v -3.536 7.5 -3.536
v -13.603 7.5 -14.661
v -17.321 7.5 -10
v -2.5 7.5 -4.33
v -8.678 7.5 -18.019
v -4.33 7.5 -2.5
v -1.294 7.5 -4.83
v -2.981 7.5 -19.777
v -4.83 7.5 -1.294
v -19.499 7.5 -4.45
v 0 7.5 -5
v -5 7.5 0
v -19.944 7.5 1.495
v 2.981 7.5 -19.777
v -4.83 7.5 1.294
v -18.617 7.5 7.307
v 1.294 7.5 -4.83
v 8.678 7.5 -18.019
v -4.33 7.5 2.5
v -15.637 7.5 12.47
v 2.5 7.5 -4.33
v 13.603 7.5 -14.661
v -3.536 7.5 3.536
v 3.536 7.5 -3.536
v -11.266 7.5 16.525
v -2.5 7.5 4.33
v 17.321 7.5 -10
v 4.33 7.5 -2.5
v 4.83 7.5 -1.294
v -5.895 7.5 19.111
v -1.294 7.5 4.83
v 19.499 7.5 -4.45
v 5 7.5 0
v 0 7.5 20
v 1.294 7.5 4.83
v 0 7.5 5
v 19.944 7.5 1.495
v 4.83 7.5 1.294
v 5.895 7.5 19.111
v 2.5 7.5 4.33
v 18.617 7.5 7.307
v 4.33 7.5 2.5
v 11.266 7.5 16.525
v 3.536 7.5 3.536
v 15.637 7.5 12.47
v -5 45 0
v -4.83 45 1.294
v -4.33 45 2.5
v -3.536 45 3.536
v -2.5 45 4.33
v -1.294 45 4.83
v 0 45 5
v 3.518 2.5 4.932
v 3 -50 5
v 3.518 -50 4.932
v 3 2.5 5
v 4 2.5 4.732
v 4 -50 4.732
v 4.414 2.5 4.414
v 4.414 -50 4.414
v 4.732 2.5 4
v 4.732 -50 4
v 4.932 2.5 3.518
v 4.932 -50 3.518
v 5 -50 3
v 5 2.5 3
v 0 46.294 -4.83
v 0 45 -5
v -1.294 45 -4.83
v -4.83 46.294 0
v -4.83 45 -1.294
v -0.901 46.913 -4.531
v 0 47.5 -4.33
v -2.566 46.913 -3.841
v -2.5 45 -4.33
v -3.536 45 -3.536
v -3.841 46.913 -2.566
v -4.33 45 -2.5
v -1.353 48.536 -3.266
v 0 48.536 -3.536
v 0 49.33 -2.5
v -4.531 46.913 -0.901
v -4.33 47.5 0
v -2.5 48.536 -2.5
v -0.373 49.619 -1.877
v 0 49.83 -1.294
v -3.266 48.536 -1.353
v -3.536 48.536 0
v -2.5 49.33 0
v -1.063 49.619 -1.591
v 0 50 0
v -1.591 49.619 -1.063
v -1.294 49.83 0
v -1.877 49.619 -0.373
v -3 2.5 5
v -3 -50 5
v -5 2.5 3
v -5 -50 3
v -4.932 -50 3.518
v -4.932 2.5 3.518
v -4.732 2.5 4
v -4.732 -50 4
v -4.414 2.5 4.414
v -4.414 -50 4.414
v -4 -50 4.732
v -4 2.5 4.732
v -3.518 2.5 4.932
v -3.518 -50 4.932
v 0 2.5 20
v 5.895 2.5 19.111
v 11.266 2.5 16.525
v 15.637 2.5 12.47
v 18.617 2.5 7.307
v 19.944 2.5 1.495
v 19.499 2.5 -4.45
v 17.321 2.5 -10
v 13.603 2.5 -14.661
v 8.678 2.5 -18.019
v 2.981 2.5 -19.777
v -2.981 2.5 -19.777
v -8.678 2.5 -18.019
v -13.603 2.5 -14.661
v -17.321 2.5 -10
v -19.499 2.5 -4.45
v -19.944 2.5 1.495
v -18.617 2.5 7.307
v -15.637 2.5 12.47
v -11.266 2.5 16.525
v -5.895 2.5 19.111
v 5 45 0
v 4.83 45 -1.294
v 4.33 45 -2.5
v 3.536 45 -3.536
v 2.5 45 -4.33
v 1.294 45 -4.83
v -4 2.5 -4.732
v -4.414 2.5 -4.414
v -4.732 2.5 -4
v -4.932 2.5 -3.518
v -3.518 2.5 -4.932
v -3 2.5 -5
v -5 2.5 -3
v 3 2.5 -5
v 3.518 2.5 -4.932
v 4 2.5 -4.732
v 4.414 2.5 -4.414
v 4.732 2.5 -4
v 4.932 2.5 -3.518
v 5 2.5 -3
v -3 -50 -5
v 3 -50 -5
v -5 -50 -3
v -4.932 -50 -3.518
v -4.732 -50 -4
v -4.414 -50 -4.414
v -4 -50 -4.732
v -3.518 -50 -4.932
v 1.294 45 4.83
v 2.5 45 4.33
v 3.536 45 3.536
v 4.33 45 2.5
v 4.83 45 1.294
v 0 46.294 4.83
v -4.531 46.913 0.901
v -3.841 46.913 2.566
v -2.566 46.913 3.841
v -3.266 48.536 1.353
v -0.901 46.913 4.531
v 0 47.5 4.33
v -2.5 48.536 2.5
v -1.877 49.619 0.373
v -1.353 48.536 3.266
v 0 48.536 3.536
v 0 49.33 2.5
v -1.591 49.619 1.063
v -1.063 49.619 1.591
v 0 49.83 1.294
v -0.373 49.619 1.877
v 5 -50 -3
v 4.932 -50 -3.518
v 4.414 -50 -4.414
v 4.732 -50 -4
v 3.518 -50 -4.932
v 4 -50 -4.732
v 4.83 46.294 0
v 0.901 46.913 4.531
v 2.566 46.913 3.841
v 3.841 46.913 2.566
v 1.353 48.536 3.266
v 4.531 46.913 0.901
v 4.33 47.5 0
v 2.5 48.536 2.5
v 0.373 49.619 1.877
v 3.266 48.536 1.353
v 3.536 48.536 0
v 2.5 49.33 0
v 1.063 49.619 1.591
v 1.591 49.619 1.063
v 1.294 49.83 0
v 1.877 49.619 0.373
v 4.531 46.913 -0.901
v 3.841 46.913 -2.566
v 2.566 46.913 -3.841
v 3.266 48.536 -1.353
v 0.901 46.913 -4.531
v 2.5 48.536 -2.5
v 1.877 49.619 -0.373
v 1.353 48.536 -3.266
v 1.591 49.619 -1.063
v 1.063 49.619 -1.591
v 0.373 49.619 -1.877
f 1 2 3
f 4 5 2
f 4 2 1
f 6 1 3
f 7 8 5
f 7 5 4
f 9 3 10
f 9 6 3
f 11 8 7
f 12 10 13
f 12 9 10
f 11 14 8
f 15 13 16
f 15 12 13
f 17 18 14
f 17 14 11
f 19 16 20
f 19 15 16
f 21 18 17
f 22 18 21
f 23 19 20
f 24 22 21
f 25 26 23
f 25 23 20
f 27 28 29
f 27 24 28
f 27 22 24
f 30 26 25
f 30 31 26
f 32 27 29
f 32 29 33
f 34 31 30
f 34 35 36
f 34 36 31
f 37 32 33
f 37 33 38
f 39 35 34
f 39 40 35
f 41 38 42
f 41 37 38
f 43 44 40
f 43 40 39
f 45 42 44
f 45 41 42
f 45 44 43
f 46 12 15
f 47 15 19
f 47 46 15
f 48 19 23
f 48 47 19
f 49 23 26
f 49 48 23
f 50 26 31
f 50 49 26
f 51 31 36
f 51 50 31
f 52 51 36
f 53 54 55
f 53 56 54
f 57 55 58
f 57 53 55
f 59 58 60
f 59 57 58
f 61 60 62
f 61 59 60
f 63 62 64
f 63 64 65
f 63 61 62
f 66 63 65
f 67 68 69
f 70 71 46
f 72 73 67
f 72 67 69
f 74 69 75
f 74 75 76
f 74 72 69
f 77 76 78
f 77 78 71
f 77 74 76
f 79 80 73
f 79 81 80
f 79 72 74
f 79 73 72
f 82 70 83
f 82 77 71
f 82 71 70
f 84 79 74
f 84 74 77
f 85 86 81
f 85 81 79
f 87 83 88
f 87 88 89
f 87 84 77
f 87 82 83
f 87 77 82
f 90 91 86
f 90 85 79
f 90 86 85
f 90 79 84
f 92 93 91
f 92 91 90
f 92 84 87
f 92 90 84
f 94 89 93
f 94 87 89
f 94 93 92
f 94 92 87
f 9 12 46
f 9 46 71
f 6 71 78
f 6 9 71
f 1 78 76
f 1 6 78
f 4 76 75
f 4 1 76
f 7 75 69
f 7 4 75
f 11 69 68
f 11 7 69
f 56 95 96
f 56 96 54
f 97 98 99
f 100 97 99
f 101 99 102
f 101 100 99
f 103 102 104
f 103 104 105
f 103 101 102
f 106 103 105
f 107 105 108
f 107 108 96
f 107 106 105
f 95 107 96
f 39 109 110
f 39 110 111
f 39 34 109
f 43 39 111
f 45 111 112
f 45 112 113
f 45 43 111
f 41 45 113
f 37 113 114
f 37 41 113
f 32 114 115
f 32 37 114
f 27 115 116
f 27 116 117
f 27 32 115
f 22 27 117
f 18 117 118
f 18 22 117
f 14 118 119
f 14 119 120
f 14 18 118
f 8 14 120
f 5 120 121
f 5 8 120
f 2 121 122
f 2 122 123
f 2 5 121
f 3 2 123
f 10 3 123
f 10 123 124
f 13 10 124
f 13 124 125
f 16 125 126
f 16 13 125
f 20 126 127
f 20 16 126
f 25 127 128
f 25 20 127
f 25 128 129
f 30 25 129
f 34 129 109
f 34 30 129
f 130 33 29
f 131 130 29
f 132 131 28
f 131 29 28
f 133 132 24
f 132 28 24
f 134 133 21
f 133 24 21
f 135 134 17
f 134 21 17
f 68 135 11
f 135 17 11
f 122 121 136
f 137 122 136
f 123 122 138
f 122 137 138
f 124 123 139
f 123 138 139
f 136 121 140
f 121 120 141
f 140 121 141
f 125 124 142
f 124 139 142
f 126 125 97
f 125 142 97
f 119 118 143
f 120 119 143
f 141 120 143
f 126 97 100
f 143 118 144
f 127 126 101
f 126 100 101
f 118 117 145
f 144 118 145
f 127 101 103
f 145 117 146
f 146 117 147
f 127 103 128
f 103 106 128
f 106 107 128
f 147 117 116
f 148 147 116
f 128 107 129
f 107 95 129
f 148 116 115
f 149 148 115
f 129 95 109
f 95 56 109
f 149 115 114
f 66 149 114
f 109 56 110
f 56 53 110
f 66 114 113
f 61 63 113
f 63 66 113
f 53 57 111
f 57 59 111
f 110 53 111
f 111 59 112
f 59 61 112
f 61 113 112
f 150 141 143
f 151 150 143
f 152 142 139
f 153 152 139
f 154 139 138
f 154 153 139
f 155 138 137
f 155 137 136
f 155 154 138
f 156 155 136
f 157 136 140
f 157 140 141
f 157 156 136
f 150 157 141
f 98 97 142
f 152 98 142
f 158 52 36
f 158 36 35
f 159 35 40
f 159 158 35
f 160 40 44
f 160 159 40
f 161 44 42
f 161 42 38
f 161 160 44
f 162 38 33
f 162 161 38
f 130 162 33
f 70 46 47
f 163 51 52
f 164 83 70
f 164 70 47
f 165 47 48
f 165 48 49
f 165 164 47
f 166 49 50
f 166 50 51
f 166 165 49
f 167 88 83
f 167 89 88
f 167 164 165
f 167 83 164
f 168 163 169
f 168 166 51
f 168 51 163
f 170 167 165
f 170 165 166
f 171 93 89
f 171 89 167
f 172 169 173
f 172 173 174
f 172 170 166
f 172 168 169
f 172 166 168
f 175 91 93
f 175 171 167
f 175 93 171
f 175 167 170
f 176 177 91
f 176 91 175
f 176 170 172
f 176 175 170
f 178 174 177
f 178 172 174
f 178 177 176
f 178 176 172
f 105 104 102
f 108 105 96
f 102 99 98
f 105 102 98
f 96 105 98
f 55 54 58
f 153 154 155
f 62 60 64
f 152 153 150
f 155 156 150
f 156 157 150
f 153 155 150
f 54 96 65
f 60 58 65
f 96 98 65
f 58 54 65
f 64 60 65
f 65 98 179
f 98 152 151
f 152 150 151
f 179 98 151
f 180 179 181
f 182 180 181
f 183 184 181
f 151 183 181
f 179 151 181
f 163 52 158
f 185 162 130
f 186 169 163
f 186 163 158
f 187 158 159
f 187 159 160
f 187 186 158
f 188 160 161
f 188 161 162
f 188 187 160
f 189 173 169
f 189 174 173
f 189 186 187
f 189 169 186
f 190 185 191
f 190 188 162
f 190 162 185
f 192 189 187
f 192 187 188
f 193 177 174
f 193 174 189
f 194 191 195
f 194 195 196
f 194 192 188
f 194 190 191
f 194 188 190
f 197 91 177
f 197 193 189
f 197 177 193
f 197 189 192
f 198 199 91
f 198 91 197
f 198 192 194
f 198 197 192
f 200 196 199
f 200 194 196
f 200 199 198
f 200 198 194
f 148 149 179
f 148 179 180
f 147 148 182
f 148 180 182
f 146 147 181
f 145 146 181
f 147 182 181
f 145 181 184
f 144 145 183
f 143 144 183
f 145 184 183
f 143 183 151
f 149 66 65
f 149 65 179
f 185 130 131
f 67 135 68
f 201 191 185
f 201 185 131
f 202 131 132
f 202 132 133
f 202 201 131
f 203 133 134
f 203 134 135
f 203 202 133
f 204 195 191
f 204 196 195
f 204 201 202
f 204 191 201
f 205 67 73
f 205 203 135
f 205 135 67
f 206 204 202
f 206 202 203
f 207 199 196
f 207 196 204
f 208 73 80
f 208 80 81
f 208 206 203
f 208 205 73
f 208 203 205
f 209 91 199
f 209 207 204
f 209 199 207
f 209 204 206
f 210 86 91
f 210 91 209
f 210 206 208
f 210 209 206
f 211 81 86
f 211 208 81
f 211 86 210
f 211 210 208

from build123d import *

# Parameters (mm, degrees)
SKETCH1_W           = 10
SKETCH1_H           = 10
BOSS_EXTRUDE1_DEPTH = 50
BOSS_EXTRUDE2_START = -45
SKETCH2_R           = 20
BOSS_EXTRUDE2_DEPTH = 2.5
FILLET2_R           = 2
FILLET3_R           = 5
FILLET4_R           = 5


with BuildPart() as part:
    # Sketch1 → Boss-Extrude1 (new, symmetric)
    with BuildSketch(Plane(origin=(0, 0, 0), x_dir=(1, 0, 0), z_dir=(0, 1, 0))):
        Rectangle(SKETCH1_W, SKETCH1_H)
    extrude(amount=BOSS_EXTRUDE1_DEPTH, both=True)

    # Sketch2 → Boss-Extrude2 (add, symmetric)
    with BuildSketch(Plane(origin=(0, 50, 0), x_dir=(1, 0, 0), z_dir=(0, 1, 0)).offset(BOSS_EXTRUDE2_START)):
        with Locations(Location((0, 0, 0), (0, 0, 270))):
            Circle(SKETCH2_R)
    extrude(amount=BOSS_EXTRUDE2_DEPTH, both=True)

    # Fillet2
    fillet2_edges = [part.edges().sort_by_distance(p)[0] for p in [
        (5, -23.75, 5),
        (-5, -23.75, 5),
        (-5, -23.75, -5),
        (5, -23.75, -5),
    ]]
    fillet(fillet2_edges, radius=FILLET2_R)

    # Fillet3
    fillet3_edges = [part.edges().sort_by_distance(p)[0] for p in [
        (-5, 28.75, -5),
        (-5, 28.75, 5),
        (5, 28.75, 5),
        (5, 28.75, -5),
    ]]
    fillet(fillet3_edges, radius=FILLET3_R - 0.0001)  # a hair under: the kernel refuses the full size

    # Fillet4
    fillet4_edges = [part.edges().sort_by_distance(p)[0] for p in [
        (3.535563195, 50, -3.535563195),
        (3.535563195, 50, 3.535563195),
        (-3.535563195, 50, 3.535563195),
        (-3.535563195, 50, -3.535563195),
    ]]
    fillet(fillet4_edges, radius=FILLET4_R - 0.0001)  # a hair under: the kernel refuses the full size


solid = part.part
